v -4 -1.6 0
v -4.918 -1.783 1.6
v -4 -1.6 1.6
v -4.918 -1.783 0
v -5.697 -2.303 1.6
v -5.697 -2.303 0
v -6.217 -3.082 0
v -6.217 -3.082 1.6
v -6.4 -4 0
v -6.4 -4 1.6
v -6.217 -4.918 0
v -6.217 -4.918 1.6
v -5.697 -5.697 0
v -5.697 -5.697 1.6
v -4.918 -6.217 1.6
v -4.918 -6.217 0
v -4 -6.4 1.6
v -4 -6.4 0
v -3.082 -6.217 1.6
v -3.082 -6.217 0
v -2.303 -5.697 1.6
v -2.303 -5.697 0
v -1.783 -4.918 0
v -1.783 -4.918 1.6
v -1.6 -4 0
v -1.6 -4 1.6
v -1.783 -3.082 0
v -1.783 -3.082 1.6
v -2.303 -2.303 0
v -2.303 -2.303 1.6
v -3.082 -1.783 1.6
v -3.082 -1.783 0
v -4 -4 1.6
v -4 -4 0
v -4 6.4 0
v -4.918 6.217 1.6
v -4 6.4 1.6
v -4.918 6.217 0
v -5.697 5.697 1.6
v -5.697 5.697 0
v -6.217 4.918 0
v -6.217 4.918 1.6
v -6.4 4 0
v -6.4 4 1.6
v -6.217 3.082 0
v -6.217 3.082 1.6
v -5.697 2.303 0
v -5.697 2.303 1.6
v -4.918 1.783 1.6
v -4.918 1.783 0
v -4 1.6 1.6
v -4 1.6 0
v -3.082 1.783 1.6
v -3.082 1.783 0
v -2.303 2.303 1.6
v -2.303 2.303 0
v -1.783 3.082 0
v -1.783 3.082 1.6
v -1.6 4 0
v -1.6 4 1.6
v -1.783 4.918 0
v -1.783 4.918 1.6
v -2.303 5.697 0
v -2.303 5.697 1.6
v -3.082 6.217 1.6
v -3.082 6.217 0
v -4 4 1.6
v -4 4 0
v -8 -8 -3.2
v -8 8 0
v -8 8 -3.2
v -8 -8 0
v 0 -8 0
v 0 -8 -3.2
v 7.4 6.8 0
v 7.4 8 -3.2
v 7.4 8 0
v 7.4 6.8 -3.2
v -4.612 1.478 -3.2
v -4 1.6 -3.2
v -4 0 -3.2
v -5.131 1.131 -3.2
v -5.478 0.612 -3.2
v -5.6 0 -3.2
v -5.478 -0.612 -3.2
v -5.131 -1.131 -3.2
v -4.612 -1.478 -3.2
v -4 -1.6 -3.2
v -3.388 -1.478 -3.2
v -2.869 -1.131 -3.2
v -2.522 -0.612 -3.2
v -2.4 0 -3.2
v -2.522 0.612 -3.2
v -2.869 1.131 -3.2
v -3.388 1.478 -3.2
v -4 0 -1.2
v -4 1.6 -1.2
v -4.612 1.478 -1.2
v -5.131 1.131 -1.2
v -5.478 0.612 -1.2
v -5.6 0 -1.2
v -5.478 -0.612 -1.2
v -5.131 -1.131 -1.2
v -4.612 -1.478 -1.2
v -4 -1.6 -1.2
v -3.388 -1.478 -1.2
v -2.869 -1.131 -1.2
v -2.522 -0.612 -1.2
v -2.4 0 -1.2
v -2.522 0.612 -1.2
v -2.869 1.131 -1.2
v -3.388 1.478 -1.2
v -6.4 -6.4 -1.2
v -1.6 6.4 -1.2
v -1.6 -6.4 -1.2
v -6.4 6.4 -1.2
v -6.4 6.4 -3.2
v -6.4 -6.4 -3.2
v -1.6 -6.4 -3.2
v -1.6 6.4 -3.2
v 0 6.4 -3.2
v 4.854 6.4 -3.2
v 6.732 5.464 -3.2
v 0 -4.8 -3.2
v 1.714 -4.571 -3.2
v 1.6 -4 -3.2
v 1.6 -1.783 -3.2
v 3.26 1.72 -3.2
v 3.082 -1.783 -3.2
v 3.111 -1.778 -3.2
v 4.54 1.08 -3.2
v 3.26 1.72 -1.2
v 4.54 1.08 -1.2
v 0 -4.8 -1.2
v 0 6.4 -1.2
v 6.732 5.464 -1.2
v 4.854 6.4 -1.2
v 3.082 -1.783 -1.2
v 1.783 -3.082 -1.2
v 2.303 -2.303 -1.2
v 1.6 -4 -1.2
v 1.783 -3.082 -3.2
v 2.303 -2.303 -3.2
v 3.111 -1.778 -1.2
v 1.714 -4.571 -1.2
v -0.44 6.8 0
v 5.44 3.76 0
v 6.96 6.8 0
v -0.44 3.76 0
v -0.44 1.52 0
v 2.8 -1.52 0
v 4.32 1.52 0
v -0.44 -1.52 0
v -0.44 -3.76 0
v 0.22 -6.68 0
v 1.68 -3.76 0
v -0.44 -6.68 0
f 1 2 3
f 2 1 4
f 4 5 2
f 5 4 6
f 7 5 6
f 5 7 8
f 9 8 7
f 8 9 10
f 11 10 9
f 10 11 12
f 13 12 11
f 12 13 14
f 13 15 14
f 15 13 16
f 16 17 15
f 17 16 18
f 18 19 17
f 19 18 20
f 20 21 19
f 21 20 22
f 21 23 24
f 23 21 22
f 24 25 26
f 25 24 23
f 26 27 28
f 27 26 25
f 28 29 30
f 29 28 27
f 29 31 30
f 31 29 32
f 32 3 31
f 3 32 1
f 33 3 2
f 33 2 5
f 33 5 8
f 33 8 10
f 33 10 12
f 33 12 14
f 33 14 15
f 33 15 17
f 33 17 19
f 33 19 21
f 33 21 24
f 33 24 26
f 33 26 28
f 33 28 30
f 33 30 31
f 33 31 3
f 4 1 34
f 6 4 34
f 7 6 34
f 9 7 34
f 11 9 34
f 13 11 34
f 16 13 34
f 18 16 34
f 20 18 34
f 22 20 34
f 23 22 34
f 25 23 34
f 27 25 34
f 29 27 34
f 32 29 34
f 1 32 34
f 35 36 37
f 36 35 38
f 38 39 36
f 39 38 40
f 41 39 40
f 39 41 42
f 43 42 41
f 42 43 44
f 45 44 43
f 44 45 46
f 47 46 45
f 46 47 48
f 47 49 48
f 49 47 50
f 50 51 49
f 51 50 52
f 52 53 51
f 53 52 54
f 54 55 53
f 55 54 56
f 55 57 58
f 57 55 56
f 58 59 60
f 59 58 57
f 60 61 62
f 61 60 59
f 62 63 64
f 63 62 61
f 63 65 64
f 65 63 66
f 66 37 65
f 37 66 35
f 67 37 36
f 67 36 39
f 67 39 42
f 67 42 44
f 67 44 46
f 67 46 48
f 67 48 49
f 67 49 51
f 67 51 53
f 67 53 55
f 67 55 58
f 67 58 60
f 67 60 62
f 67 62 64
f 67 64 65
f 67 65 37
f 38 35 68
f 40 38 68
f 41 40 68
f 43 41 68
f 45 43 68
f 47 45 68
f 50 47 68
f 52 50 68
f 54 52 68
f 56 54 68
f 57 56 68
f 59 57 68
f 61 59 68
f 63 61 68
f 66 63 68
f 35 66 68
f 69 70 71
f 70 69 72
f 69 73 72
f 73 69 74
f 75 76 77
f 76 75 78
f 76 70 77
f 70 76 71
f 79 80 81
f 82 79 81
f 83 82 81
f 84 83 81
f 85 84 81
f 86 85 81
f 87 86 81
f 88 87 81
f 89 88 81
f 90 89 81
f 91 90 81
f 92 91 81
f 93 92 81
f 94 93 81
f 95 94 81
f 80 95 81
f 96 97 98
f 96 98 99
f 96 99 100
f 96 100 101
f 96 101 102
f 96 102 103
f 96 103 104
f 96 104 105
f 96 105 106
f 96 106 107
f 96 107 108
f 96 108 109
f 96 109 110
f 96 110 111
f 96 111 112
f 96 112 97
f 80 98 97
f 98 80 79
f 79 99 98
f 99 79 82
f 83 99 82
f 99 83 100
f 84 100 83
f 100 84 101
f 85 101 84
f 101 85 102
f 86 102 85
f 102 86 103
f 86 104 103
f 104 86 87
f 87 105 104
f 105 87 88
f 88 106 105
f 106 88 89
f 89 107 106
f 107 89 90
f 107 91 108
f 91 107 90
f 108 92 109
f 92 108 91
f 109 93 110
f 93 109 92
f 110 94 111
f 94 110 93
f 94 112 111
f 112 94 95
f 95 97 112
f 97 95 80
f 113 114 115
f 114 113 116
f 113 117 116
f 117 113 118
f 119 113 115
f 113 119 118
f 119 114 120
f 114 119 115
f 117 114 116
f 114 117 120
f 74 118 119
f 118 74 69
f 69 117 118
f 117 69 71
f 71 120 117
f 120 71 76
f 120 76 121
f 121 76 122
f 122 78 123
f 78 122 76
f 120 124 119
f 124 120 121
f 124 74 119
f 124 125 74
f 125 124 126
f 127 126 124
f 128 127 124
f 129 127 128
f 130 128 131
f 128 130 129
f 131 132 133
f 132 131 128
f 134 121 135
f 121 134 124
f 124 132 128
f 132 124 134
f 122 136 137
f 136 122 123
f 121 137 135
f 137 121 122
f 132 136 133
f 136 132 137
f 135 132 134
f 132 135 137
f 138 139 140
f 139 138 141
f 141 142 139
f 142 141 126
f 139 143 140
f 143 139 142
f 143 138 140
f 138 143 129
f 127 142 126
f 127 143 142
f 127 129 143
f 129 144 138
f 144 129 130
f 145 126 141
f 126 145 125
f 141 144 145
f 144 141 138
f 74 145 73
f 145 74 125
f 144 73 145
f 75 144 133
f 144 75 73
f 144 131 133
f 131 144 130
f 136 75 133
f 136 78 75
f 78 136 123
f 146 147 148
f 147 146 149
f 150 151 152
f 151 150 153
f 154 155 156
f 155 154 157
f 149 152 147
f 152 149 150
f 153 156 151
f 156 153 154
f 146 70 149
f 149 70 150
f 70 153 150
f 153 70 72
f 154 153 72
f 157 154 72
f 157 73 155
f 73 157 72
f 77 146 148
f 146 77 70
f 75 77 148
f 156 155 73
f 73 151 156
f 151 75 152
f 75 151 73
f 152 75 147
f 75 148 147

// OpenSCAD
// file: ../p/3-16edge.scad
use <../lib.scad>
function ldraw_lib__3_16edge() = [
// 0 Circle 0.1875
// 0 Name: 3-16edge.dat
// 0 Author: Donald Sutter [technog]
// 0 !LDRAW_ORG Primitive UPDATE 2017-01
// 0 !LICENSE Licensed under CC BY 4.0 : see CAreadme.txt
// 
// 0 BFC CERTIFY CCW
  [0,"BFC","CERTIFY"],
  [0,"BFC","CCW"],
// 
// 0 !HISTORY 2004-03-02 [PTadmin] Official Update 2004-01
// 0 !HISTORY 2007-06-24 [PTadmin] Header formatted for Contributor Agreement
// 0 !HISTORY 2008-07-01 [PTadmin] Official Update 2008-01
// 0 !HISTORY 2017-01-15 [Steffen] BFCed
// 0 !HISTORY 2017-12-30 [PTadmin] Official Update 2017-01
// 
// 
// 2 24 1 0 0 0.9239 0 0.3827
  [2,24,1,0,0,0.9239,0,0.3827],
// 2 24 0.9239 0 0.3827 0.7071 0 0.7071
  [2,24,0.9239,0,0.3827,0.7071,0,0.7071],
// 2 24 0.7071 0 0.7071 0.3827 0 0.9239
  [2,24,0.7071,0,0.7071,0.3827,0,0.9239],
];
module ldraw_lib__3_16edge(step=0, col=false, unit=2/5, alt=false, line=0.2, solid=!$preview)
    makepoly(ldraw_lib__3_16edge(), step=step, col=col, unit=unit, alt=alt, line=line, solid=solid);
ldraw_lib__3_16edge(line=0.2);
// file: ../p/3-16cyli.scad
use <../lib.scad>
$fa=1; $fs=0.2;
function ldraw_lib__3_16cyli(realsolid=false) = [
// 0 Cylinder 0.1875
// 0 Name: 3-16cyli.dat
// 0 Author: Mark Kennedy [mkennedy]
// 0 !LDRAW_ORG Primitive UPDATE 2005-01
// 0 !LICENSE Licensed under CC BY 2.0 and CC BY 4.0 : see CAreadme.txt
// 
// 0 BFC CERTIFY CCW
  [0,"BFC","CERTIFY"],
  [0,"BFC","CCW"],
// 
// 0 !HISTORY 2004-03-02 [PTadmin] Official Update 2004-01
// 0 !HISTORY 2004-12-11 [nielsk] Recreated using Primitive Generator, Edge lines fixed, BFC changed to CCW
// 0 !HISTORY 2005-12-28 [PTadmin] Official Update 2005-01
// 0 !HISTORY 2007-06-24 [PTadmin] Header formatted for Contributor Agreement
// 0 !HISTORY 2008-07-01 [PTadmin] Official Update 2008-01
// 
// 
// 4 16 .9239 1 .3827 .9239 0 .3827 1 0 0 1 1 0
  [4,16,.9239,1,.3827,.9239,0,.3827,1,0,0,1,1,0],
// 4 16 .7071 1 .7071 .7071 0 .7071 .9239 0 .3827 .9239 1 .3827
  [4,16,.7071,1,.7071,.7071,0,.7071,.9239,0,.3827,.9239,1,.3827],
// 4 16 .3827 1 .9239 .3827 0 .9239 .7071 0 .7071 .7071 1 .7071
  [4,16,.3827,1,.9239,.3827,0,.9239,.7071,0,.7071,.7071,1,.7071],
// 5 24 1 1 0 1 0 0 1 1 -.4142 .9239 1 .3827
  [5,24,1,1,0,1,0,0,1,1,-.4142,.9239,1,.3827],
// 5 24 .9239 1 .3827 .9239 0 .3827 1 1 0 .7071 1 .7071
  [5,24,.9239,1,.3827,.9239,0,.3827,1,1,0,.7071,1,.7071],
// 5 24 .7071 1 .7071 .7071 0 .7071 .9239 1 .3827 .3827 1 .9239
  [5,24,.7071,1,.7071,.7071,0,.7071,.9239,1,.3827,.3827,1,.9239],
// 5 24 .3827 1 .9239 .3827 0 .9239 .7071 1 .7071 0 1 1.0824
  [5,24,.3827,1,.9239,.3827,0,.9239,.7071,1,.7071,0,1,1.0824],
// 0
];
module ldraw_lib__3_16cyli(step=0, col=false, unit=2/5, alt=false, line=0.2, solid=!$preview)
    makepoly(ldraw_lib__3_16cyli(solid), step=step, col=col, unit=unit, alt=alt, line=line, solid=solid);
ldraw_lib__3_16cyli(line=0.2);
// file: ../p/4-4edge.scad
use <../lib.scad>
function ldraw_lib__4_4edge() = [
// 0 Circle 1.0
// 0 Name: 4-4edge.dat
// 0 Author: James Jessiman
// 0 !LDRAW_ORG Primitive UPDATE 2017-01
// 0 !LICENSE Licensed under CC BY 2.0 and CC BY 4.0 : see CAreadme.txt
// 
// 0 BFC CERTIFY CCW
  [0,"BFC","CERTIFY"],
  [0,"BFC","CCW"],
// 
// 0 !HISTORY 1998-12-15 [PTadmin] Official Update 1998-10
// 0 !HISTORY 2005-12-28 [PTadmin] Official Update 2005-01
// 0 !HISTORY 2007-06-24 [PTadmin] Header formatted for Contributor Agreement
// 0 !HISTORY 2008-07-01 [PTadmin] Official Update 2008-01
// 0 !HISTORY 2017-01-15 [Steffen] BFCed
// 0 !HISTORY 2017-12-30 [PTadmin] Official Update 2017-01
// 
// 
// 2 24 1 0 0 0.9239 0 0.3827
  [2,24,1,0,0,0.9239,0,0.3827],
// 2 24 0.9239 0 0.3827 0.7071 0 0.7071
  [2,24,0.9239,0,0.3827,0.7071,0,0.7071],
// 2 24 0.7071 0 0.7071 0.3827 0 0.9239
  [2,24,0.7071,0,0.7071,0.3827,0,0.9239],
// 2 24 0.3827 0 0.9239 0 0 1
  [2,24,0.3827,0,0.9239,0,0,1],
// 2 24 0 0 1 -0.3827 0 0.9239
  [2,24,0,0,1,-0.3827,0,0.9239],
// 2 24 -0.3827 0 0.9239 -0.7071 0 0.7071
  [2,24,-0.3827,0,0.9239,-0.7071,0,0.7071],
// 2 24 -0.7071 0 0.7071 -0.9239 0 0.3827
  [2,24,-0.7071,0,0.7071,-0.9239,0,0.3827],
// 2 24 -0.9239 0 0.3827 -1 0 -0
  [2,24,-0.9239,0,0.3827,-1,0,-0],
// 2 24 -1 0 -0 -0.9239 0 -0.3827
  [2,24,-1,0,-0,-0.9239,0,-0.3827],
// 2 24 -0.9239 0 -0.3827 -0.7071 0 -0.7071
  [2,24,-0.9239,0,-0.3827,-0.7071,0,-0.7071],
// 2 24 -0.7071 0 -0.7071 -0.3827 0 -0.9239
  [2,24,-0.7071,0,-0.7071,-0.3827,0,-0.9239],
// 2 24 -0.3827 0 -0.9239 0 0 -1
  [2,24,-0.3827,0,-0.9239,0,0,-1],
// 2 24 0 0 -1 0.3827 0 -0.9239
  [2,24,0,0,-1,0.3827,0,-0.9239],
// 2 24 0.3827 0 -0.9239 0.7071 0 -0.7071
  [2,24,0.3827,0,-0.9239,0.7071,0,-0.7071],
// 2 24 0.7071 0 -0.7071 0.9239 0 -0.3827
  [2,24,0.7071,0,-0.7071,0.9239,0,-0.3827],
// 2 24 0.9239 0 -0.3827 1 0 0
  [2,24,0.9239,0,-0.3827,1,0,0],
];
module ldraw_lib__4_4edge(step=0, col=false, unit=2/5, alt=false, line=0.2, solid=!$preview)
    makepoly(ldraw_lib__4_4edge(), step=step, col=col, unit=unit, alt=alt, line=line, solid=solid);
ldraw_lib__4_4edge(line=0.2);
// file: ../p/4-4disc.scad
use <../lib.scad>
function ldraw_lib__4_4disc() = [
// 0 Disc 1.0
// 0 Name: 4-4disc.dat
// 0 Author: James Jessiman
// 0 !LDRAW_ORG Primitive UPDATE 2002-02
// 0 !LICENSE Licensed under CC BY 2.0 and CC BY 4.0 : see CAreadme.txt
// 
// 0 BFC CERTIFY CCW
  [0,"BFC","CERTIFY"],
  [0,"BFC","CCW"],
// 
// 0 !HISTORY 1998-12-15 [PTadmin] Official Update 1998-10
// 0 !HISTORY 2002-03-23 [sbliss] Added BFC statement
// 0 !HISTORY 2002-04-25 [PTadmin] Official Update 2002-02
// 0 !HISTORY 2007-06-24 [PTadmin] Header formatted for Contributor Agreement
// 0 !HISTORY 2008-07-01 [PTadmin] Official Update 2008-01
// 
// 
// 3 16 0 0 0 1 0 0 0.9239 0 0.3827
  [3,16,0,0,0,1,0,0,0.9239,0,0.3827],
// 3 16 0 0 0 0.9239 0 0.3827 0.7071 0 0.7071
  [3,16,0,0,0,0.9239,0,0.3827,0.7071,0,0.7071],
// 3 16 0 0 0 0.7071 0 0.7071 0.3827 0 0.9239
  [3,16,0,0,0,0.7071,0,0.7071,0.3827,0,0.9239],
// 3 16 0 0 0 0.3827 0 0.9239 0 0 1
  [3,16,0,0,0,0.3827,0,0.9239,0,0,1],
// 3 16 0 0 0 0 0 1 -0.3827 0 0.9239
  [3,16,0,0,0,0,0,1,-0.3827,0,0.9239],
// 3 16 0 0 0 -0.3827 0 0.9239 -0.7071 0 0.7071
  [3,16,0,0,0,-0.3827,0,0.9239,-0.7071,0,0.7071],
// 3 16 0 0 0 -0.7071 0 0.7071 -0.9239 0 0.3827
  [3,16,0,0,0,-0.7071,0,0.7071,-0.9239,0,0.3827],
// 3 16 0 0 0 -0.9239 0 0.3827 -1 0 -0
  [3,16,0,0,0,-0.9239,0,0.3827,-1,0,-0],
// 3 16 0 0 0 -1 0 -0 -0.9239 0 -0.3827
  [3,16,0,0,0,-1,0,-0,-0.9239,0,-0.3827],
// 3 16 0 0 0 -0.9239 0 -0.3827 -0.7071 0 -0.7071
  [3,16,0,0,0,-0.9239,0,-0.3827,-0.7071,0,-0.7071],
// 3 16 0 0 0 -0.7071 0 -0.7071 -0.3827 0 -0.9239
  [3,16,0,0,0,-0.7071,0,-0.7071,-0.3827,0,-0.9239],
// 3 16 0 0 0 -0.3827 0 -0.9239 0 0 -1
  [3,16,0,0,0,-0.3827,0,-0.9239,0,0,-1],
// 3 16 0 0 0 0 0 -1 0.3827 0 -0.9239
  [3,16,0,0,0,0,0,-1,0.3827,0,-0.9239],
// 3 16 0 0 0 0.3827 0 -0.9239 0.7071 0 -0.7071
  [3,16,0,0,0,0.3827,0,-0.9239,0.7071,0,-0.7071],
// 3 16 0 0 0 0.7071 0 -0.7071 0.9239 0 -0.3827
  [3,16,0,0,0,0.7071,0,-0.7071,0.9239,0,-0.3827],
// 3 16 0 0 0 0.9239 0 -0.3827 1 0 0
  [3,16,0,0,0,0.9239,0,-0.3827,1,0,0],
// 0
];
module ldraw_lib__4_4disc(step=0, col=false, unit=2/5, alt=false, line=0.2, solid=!$preview)
    makepoly(ldraw_lib__4_4disc(), step=step, col=col, unit=unit, alt=alt, line=line, solid=solid);
ldraw_lib__4_4disc(line=0.2);
// file: ../p/4-4cyli.scad
use <../lib.scad>
$fa=1; $fs=0.2;
function ldraw_lib__4_4cyli(realsolid=false) = [
// 0 Cylinder 1.0
// 0 Name: 4-4cyli.dat
// 0 Author: James Jessiman
// 0 !LDRAW_ORG Primitive UPDATE 2005-01
// 0 !LICENSE Licensed under CC BY 2.0 and CC BY 4.0 : see CAreadme.txt
// 
// 0 BFC CERTIFY CCW
  [0,"BFC","CERTIFY"],
  [0,"BFC","CCW"],
// 
// 0 !HISTORY 1998-12-15 [PTadmin] Official Update 1998-10
// 0 !HISTORY 2002-03-23 [sbliss] Added BFC statement; merged headers from files in distributions LDraw 0.27 and Complete.
// 0 !HISTORY 2002-04-25 [PTadmin] Official Update 2002-02
// 0 !HISTORY 2004-12-14 [guyvivan] BFC CCW
// 0 !HISTORY 2005-12-28 [PTadmin] Official Update 2005-01
// 0 !HISTORY 2007-06-24 [PTadmin] Header formatted for Contributor Agreement
// 0 !HISTORY 2008-07-01 [PTadmin] Official Update 2008-01
// 
// 
// 4 16 1 1 0 0.9239 1 0.3827 0.9239 0 0.3827 1 0 0
  [4,16,1,1,0,0.9239,1,0.3827,0.9239,0,0.3827,1,0,0],
// 5 24 1 0 0 1 1 0 0.9239 0 0.3827 0.9239 0 -0.3827
  [5,24,1,0,0,1,1,0,0.9239,0,0.3827,0.9239,0,-0.3827],
// 4 16 0.9239 1 0.3827 0.7071 1 0.7071 0.7071 0 0.7071 0.9239 0 0.3827
  [4,16,0.9239,1,0.3827,0.7071,1,0.7071,0.7071,0,0.7071,0.9239,0,0.3827],
// 5 24 0.9239 0 0.3827 0.9239 1 0.3827 0.7071 0 0.7071 1 0 0
  [5,24,0.9239,0,0.3827,0.9239,1,0.3827,0.7071,0,0.7071,1,0,0],
// 4 16 0.7071 1 0.7071 0.3827 1 0.9239 0.3827 0 0.9239 0.7071 0 0.7071
  [4,16,0.7071,1,0.7071,0.3827,1,0.9239,0.3827,0,0.9239,0.7071,0,0.7071],
// 5 24 0.7071 0 0.7071 0.7071 1 0.7071 0.3827 0 0.9239 0.9239 0 0.3827
  [5,24,0.7071,0,0.7071,0.7071,1,0.7071,0.3827,0,0.9239,0.9239,0,0.3827],
// 4 16 0.3827 1 0.9239 0 1 1 0 0 1 0.3827 0 0.9239
  [4,16,0.3827,1,0.9239,0,1,1,0,0,1,0.3827,0,0.9239],
// 5 24 0.3827 0 0.9239 0.3827 1 0.9239 0 0 1 0.7071 0 0.7071
  [5,24,0.3827,0,0.9239,0.3827,1,0.9239,0,0,1,0.7071,0,0.7071],
// 4 16 0 1 1 -0.3827 1 0.9239 -0.3827 0 0.9239 0 0 1
  [4,16,0,1,1,-0.3827,1,0.9239,-0.3827,0,0.9239,0,0,1],
// 5 24 0 0 1 0 1 1 -0.3827 0 0.9239 0.3827 0 0.9239
  [5,24,0,0,1,0,1,1,-0.3827,0,0.9239,0.3827,0,0.9239],
// 4 16 -0.3827 1 0.9239 -0.7071 1 0.7071 -0.7071 0 0.7071 -0.3827 0 0.9239
  [4,16,-0.3827,1,0.9239,-0.7071,1,0.7071,-0.7071,0,0.7071,-0.3827,0,0.9239],
// 5 24 -0.3827 0 0.9239 -0.3827 1 0.9239 -0.7071 0 0.7071 0 0 1
  [5,24,-0.3827,0,0.9239,-0.3827,1,0.9239,-0.7071,0,0.7071,0,0,1],
// 4 16 -0.7071 1 0.7071 -0.9239 1 0.3827 -0.9239 0 0.3827 -0.7071 0 0.7071
  [4,16,-0.7071,1,0.7071,-0.9239,1,0.3827,-0.9239,0,0.3827,-0.7071,0,0.7071],
// 5 24 -0.7071 0 0.7071 -0.7071 1 0.7071 -0.9239 0 0.3827 -0.3827 0 0.9239
  [5,24,-0.7071,0,0.7071,-0.7071,1,0.7071,-0.9239,0,0.3827,-0.3827,0,0.9239],
// 4 16 -0.9239 1 0.3827 -1 1 0 -1 0 0 -0.9239 0 0.3827
  [4,16,-0.9239,1,0.3827,-1,1,0,-1,0,0,-0.9239,0,0.3827],
// 5 24 -0.9239 0 0.3827 -0.9239 1 0.3827 -1 0 0 -0.7071 0 0.7071
  [5,24,-0.9239,0,0.3827,-0.9239,1,0.3827,-1,0,0,-0.7071,0,0.7071],
// 4 16 -1 1 0 -0.9239 1 -0.3827 -0.9239 0 -0.3827 -1 0 0
  [4,16,-1,1,0,-0.9239,1,-0.3827,-0.9239,0,-0.3827,-1,0,0],
// 5 24 -1 0 0 -1 1 0 -0.9239 0 -0.3827 -0.9239 0 0.3827
  [5,24,-1,0,0,-1,1,0,-0.9239,0,-0.3827,-0.9239,0,0.3827],
// 4 16 -0.9239 1 -0.3827 -0.7071 1 -0.7071 -0.7071 0 -0.7071 -0.9239 0 -0.3827
  [4,16,-0.9239,1,-0.3827,-0.7071,1,-0.7071,-0.7071,0,-0.7071,-0.9239,0,-0.3827],
// 5 24 -0.9239 0 -0.3827 -0.9239 1 -0.3827 -0.7071 0 -0.7071 -1 0 0
  [5,24,-0.9239,0,-0.3827,-0.9239,1,-0.3827,-0.7071,0,-0.7071,-1,0,0],
// 4 16 -0.7071 1 -0.7071 -0.3827 1 -0.9239 -0.3827 0 -0.9239 -0.7071 0 -0.7071
  [4,16,-0.7071,1,-0.7071,-0.3827,1,-0.9239,-0.3827,0,-0.9239,-0.7071,0,-0.7071],
// 5 24 -0.7071 0 -0.7071 -0.7071 1 -0.7071 -0.3827 0 -0.9239 -0.9239 0 -0.3827
  [5,24,-0.7071,0,-0.7071,-0.7071,1,-0.7071,-0.3827,0,-0.9239,-0.9239,0,-0.3827],
// 4 16 -0.3827 1 -0.9239 0 1 -1 0 0 -1 -0.3827 0 -0.9239
  [4,16,-0.3827,1,-0.9239,0,1,-1,0,0,-1,-0.3827,0,-0.9239],
// 5 24 -0.3827 0 -0.9239 -0.3827 1 -0.9239 0 0 -1 -0.7071 0 -0.7071
  [5,24,-0.3827,0,-0.9239,-0.3827,1,-0.9239,0,0,-1,-0.7071,0,-0.7071],
// 4 16 0 1 -1 0.3827 1 -0.9239 0.3827 0 -0.9239 0 0 -1
  [4,16,0,1,-1,0.3827,1,-0.9239,0.3827,0,-0.9239,0,0,-1],
// 5 24 0 0 -1 0 1 -1 0.3827 0 -0.9239 -0.3827 0 -0.9239
  [5,24,0,0,-1,0,1,-1,0.3827,0,-0.9239,-0.3827,0,-0.9239],
// 4 16 0.3827 1 -0.9239 0.7071 1 -0.7071 0.7071 0 -0.7071 0.3827 0 -0.9239
  [4,16,0.3827,1,-0.9239,0.7071,1,-0.7071,0.7071,0,-0.7071,0.3827,0,-0.9239],
// 5 24 0.3827 0 -0.9239 0.3827 1 -0.9239 0.7071 0 -0.7071 0 0 -1
  [5,24,0.3827,0,-0.9239,0.3827,1,-0.9239,0.7071,0,-0.7071,0,0,-1],
// 4 16 0.7071 1 -0.7071 0.9239 1 -0.3827 0.9239 0 -0.3827 0.7071 0 -0.7071
  [4,16,0.7071,1,-0.7071,0.9239,1,-0.3827,0.9239,0,-0.3827,0.7071,0,-0.7071],
// 5 24 0.7071 0 -0.7071 0.7071 1 -0.7071 0.9239 0 -0.3827 0.3827 0 -0.9239
  [5,24,0.7071,0,-0.7071,0.7071,1,-0.7071,0.9239,0,-0.3827,0.3827,0,-0.9239],
// 4 16 0.9239 1 -0.3827 1 1 0 1 0 0 0.9239 0 -0.3827
  [4,16,0.9239,1,-0.3827,1,1,0,1,0,0,0.9239,0,-0.3827],
// 5 24 0.9239 0 -0.3827 0.9239 1 -0.3827 1 0 0 0.7071 0 -0.7071
  [5,24,0.9239,0,-0.3827,0.9239,1,-0.3827,1,0,0,0.7071,0,-0.7071],
// 0
];
module ldraw_lib__4_4cyli(step=0, col=false, unit=2/5, alt=false, line=0.2, solid=!$preview)
    makepoly(ldraw_lib__4_4cyli(solid), step=step, col=col, unit=unit, alt=alt, line=line, solid=solid);
ldraw_lib__4_4cyli(line=0.2);
// file: ../p/rect3.scad
use <../lib.scad>
function ldraw_lib__rect3() = [
// 0 Rectangle with 3 Edges
// 0 Name: rect3.dat
// 0 Author: Mark Kennedy [mkennedy]
// 0 !LDRAW_ORG Primitive UPDATE 2010-01
// 0 !LICENSE Licensed under CC BY 4.0 : see CAreadme.txt
// 
// 0 BFC CERTIFY CCW
  [0,"BFC","CERTIFY"],
  [0,"BFC","CCW"],
// 
// 0 !HISTORY 2003-08-01 [PTadmin] Official Update 2003-02
// 0 !HISTORY 2007-06-24 [PTadmin] Header formatted for Contributor Agreement
// 0 !HISTORY 2008-07-01 [PTadmin] Official Update 2008-01
// 0 !HISTORY 2010-01-17 [mikeheide] Change winding to CCW
// 0 !HISTORY 2010-04-05 [PTadmin] Official Update 2010-01
// 
// 
// 2 24 1 0 1 -1 0 1
  [2,24,1,0,1,-1,0,1],
// 2 24 1 0 1 1 0 -1
  [2,24,1,0,1,1,0,-1],
// 2 24 -1 0 1 -1 0 -1
  [2,24,-1,0,1,-1,0,-1],
// 4 16 -1 0 1 -1 0 -1 1 0 -1 1 0 1
  [4,16,-1,0,1,-1,0,-1,1,0,-1,1,0,1],
// 0 //
];
module ldraw_lib__rect3(step=0, col=false, unit=2/5, alt=false, line=0.2, solid=!$preview)
    makepoly(ldraw_lib__rect3(), step=step, col=col, unit=unit, alt=alt, line=line, solid=solid);
ldraw_lib__rect3(line=0.2);
// file: ../p/rect.scad
use <../lib.scad>
function ldraw_lib__rect() = [
// 0 Rectangle
// 0 Name: rect.dat
// 0 Author: James Jessiman
// 0 !LDRAW_ORG Primitive UPDATE 2010-01
// 0 !LICENSE Licensed under CC BY 2.0 and CC BY 4.0 : see CAreadme.txt
// 
// 0 BFC CERTIFY CCW
  [0,"BFC","CERTIFY"],
  [0,"BFC","CCW"],
// 
// 0 !HISTORY 2002-04-05 [hafhead] Added BFC statement
// 0 !HISTORY 2002-04-25 [PTadmin] Official Update 2002-02
// 0 !HISTORY 2007-06-24 [PTadmin] Header formatted for Contributor Agreement
// 0 !HISTORY 2008-07-01 [PTadmin] Official Update 2008-01
// 0 !HISTORY 2010-01-17 [mikeheide] changed winding to CCW
// 0 !HISTORY 2010-04-05 [PTadmin] Official Update 2010-01
// 
// 
// 2 24 1 0 1 -1 0 1
  [2,24,1,0,1,-1,0,1],
// 2 24 -1 0 1 -1 0 -1
  [2,24,-1,0,1,-1,0,-1],
// 2 24 -1 0 -1 1 0 -1
  [2,24,-1,0,-1,1,0,-1],
// 2 24 1 0 -1 1 0 1
  [2,24,1,0,-1,1,0,1],
// 4 16 -1 0 1 -1 0 -1 1 0 -1 1 0 1
  [4,16,-1,0,1,-1,0,-1,1,0,-1,1,0,1],
// 0
];
makepoly(ldraw_lib__rect(), line=0.2);
// file: ../p/3-16tndis.scad
use <../lib.scad>
function ldraw_lib__3_16tndis() = [
// 0 Disc Negative Truncated 0.1875
// 0 Name: 3-16tndis.dat
// 0 Author: Massimo Maso [Sirio]
// 0 !LDRAW_ORG Primitive UPDATE 2022-02
// 0 !LICENSE Licensed under CC BY 4.0 : see CAreadme.txt
// 
// 0 BFC CERTIFY CCW
  [0,"BFC","CERTIFY"],
  [0,"BFC","CCW"],
// 
// 0 !HISTORY 2022-03-06 [PTadmin] Official Update 2022-02
// 
// 
// 3 16 1 0 .9239 .9239 0 .3827 1 0 0
  [3,16,1,0,.9239,.9239,0,.3827,1,0,0],
// 3 16 1 0 .9239 .7071 0 .7071 .9239 0 .3827
  [3,16,1,0,.9239,.7071,0,.7071,.9239,0,.3827],
// 3 16 1 0 .9239 .3827 0 .9239 .7071 0 .7071
  [3,16,1,0,.9239,.3827,0,.9239,.7071,0,.7071],
];
module ldraw_lib__3_16tndis(step=0, col=false, unit=2/5, alt=false, line=0.2, solid=!$preview)
    makepoly(ldraw_lib__3_16tndis(), step=step, col=col, unit=unit, alt=alt, line=line, solid=solid);
ldraw_lib__3_16tndis(line=0.2);
// file: ../p/3-16cylo.scad
use <../lib.scad>
use <3-16cyli.scad>
use <3-16edge.scad>
$fa=1; $fs=0.2;
function ldraw_lib__3_16cylo(realsolid=false) = [
// 0 Cylinder Open 0.1875
// 0 Name: 3-16cylo.dat
// 0 Author: J.C. Tchang [tchang]
// 0 !LDRAW_ORG Primitive UPDATE 2013-01
// 0 !LICENSE Licensed under CC BY 2.0 and CC BY 4.0 : see CAreadme.txt
// 
// 0 BFC CERTIFY CCW
  [0,"BFC","CERTIFY"],
  [0,"BFC","CCW"],
// 
// 0 !HISTORY 2013-07-21 [PTadmin] Official Update 2013-01
// 
// 
// 1 16 0 0 0 1 0 0 0 1 0 0 0 1 3-16edge.dat
  [1,16,0,0,0,1,0,0,0,1,0,0,0,1, ldraw_lib__3_16edge(realsolid)],
// 1 16 0 1 0 1 0 0 0 1 0 0 0 1 3-16edge.dat
  [1,16,0,1,0,1,0,0,0,1,0,0,0,1, ldraw_lib__3_16edge(realsolid)],
// 1 16 0 0 0 1 0 0 0 1 0 0 0 1 3-16cyli.dat
  [1,16,0,0,0,1,0,0,0,1,0,0,0,1, ldraw_lib__3_16cyli(realsolid)],
];
module ldraw_lib__3_16cylo(step=0, col=false, unit=2/5, alt=false, line=0.2, solid=!$preview)
    makepoly(ldraw_lib__3_16cylo(solid), step=step, col=col, unit=unit, alt=alt, line=line, solid=solid);
ldraw_lib__3_16cylo(line=0.2);
// file: ../p/3-16chrd.scad
use <../lib.scad>
$fa=1; $fs=0.2;
function ldraw_lib__3_16chrd(realsolid=false) = [
// 0 Chord 0.1875
// 0 Name: 3-16chrd.dat
// 0 Author: Niels Karsdorp [nielsk]
// 0 !LDRAW_ORG Primitive UPDATE 2009-01
// 0 !LICENSE Licensed under CC BY 2.0 and CC BY 4.0 : see CAreadme.txt
// 
// 0 BFC CERTIFY CCW
  [0,"BFC","CERTIFY"],
  [0,"BFC","CCW"],
// 
// 0 !HISTORY 2009-05-02 [PTadmin] Official Update 2009-01
// 
// 
// 4 16 1 0 0 0.9239 0 0.3827 0.7071 0 0.7071 0.3827 0 0.9239
  [4,16,1,0,0,0.9239,0,0.3827,0.7071,0,0.7071,0.3827,0,0.9239],
// 0
// 
];
module ldraw_lib__3_16chrd(step=0, col=false, unit=2/5, alt=false, line=0.2, solid=!$preview)
    makepoly(ldraw_lib__3_16chrd(solid), step=step, col=col, unit=unit, alt=alt, line=line, solid=solid);
ldraw_lib__3_16chrd(line=0.2);
// file: ../p/stud.scad
use <../lib.scad>
use <4-4cyli.scad>
use <4-4disc.scad>
use <4-4edge.scad>
function ldraw_lib__stud() = [
// 0 Stud
// 0 Name: stud.dat
// 0 Author: James Jessiman
// 0 !LDRAW_ORG Primitive UPDATE 2012-01
// 0 !LICENSE Licensed under CC BY 4.0 : see CAreadme.txt
// 
// 0 BFC CERTIFY CCW
  [0,"BFC","CERTIFY"],
  [0,"BFC","CCW"],
// 
// 0 !HISTORY 2002-04-04 [sbliss] Modified for BFC compliance
// 0 !HISTORY 2002-04-25 [PTadmin] Official Update 2002-02
// 0 !HISTORY 2007-06-24 [PTadmin] Header formatted for Contributor Agreement
// 0 !HISTORY 2008-07-01 [PTadmin] Official Update 2008-01
// 0 !HISTORY 2012-02-16 [Philo] Changed to CCW
// 0 !HISTORY 2012-03-30 [PTadmin] Official Update 2012-01
// 
// 
// 1 16 0 0 0 6 0 0 0 1 0 0 0 6 4-4edge.dat
  [1,16,0,0,0,6,0,0,0,1,0,0,0,6, ldraw_lib__4_4edge()],
// 1 16 0 -4 0 6 0 0 0 1 0 0 0 6 4-4edge.dat
  [1,16,0,-4,0,6,0,0,0,1,0,0,0,6, ldraw_lib__4_4edge()],
// 1 16 0 0 0 6 0 0 0 -4 0 0 0 6 4-4cyli.dat
  [1,16,0,0,0,6,0,0,0,-4,0,0,0,6, ldraw_lib__4_4cyli()],
// 1 16 0 -4 0 6 0 0 0 1 0 0 0 6 4-4disc.dat
  [1,16,0,-4,0,6,0,0,0,1,0,0,0,6, ldraw_lib__4_4disc()],
  [-1,16,0,0,0,6,0,0,0,-1,0,0,0,6, ldraw_lib__4_4disc()],
];
module ldraw_lib__stud(step=0, col=false, unit=2/5, alt=false, line=0.2, solid=!$preview)
    makepoly(ldraw_lib__stud(), step=step, col=col, unit=unit, alt=alt, line=line, solid=solid);
ldraw_lib__stud(line=0.2);
// file: ../p/stud3.scad
use <../lib.scad>
use <4-4cyli.scad>
use <4-4disc.scad>
use <4-4edge.scad>
function ldraw_lib__stud3() = [
// 0 Stud Tube Solid
// 0 Name: stud3.dat
// 0 Author: James Jessiman
// 0 !LDRAW_ORG Primitive UPDATE 2012-01
// 0 !LICENSE Licensed under CC BY 4.0 : see CAreadme.txt
// 
// 0 BFC CERTIFY CCW
  [0,"BFC","CERTIFY"],
  [0,"BFC","CCW"],
// 
// 0 !HISTORY 2002-04-04 [sbliss] Modified for BFC compliance
// 0 !HISTORY 2002-04-25 [PTadmin] Official Update 2002-02
// 0 !HISTORY 2007-06-24 [PTadmin] Header formatted for Contributor Agreement
// 0 !HISTORY 2008-07-01 [PTadmin] Official Update 2008-01
// 0 !HISTORY 2012-02-16 [Philo] Changed to CCW
// 0 !HISTORY 2012-03-30 [PTadmin] Official Update 2012-01
// 
// 
// 1 16 0 -4 0 4 0 0 0 1 0 0 0 4 4-4edge.dat
  [1,16,0,-4,0,4,0,0,0,1,0,0,0,4, ldraw_lib__4_4edge()],
// 1 16 0 0 0 4 0 0 0 1 0 0 0 4 4-4edge.dat
  [1,16,0,0,0,4,0,0,0,1,0,0,0,4, ldraw_lib__4_4edge()],
// 1 16 0 -4 0 4 0 0 0 1 0 0 0 4 4-4disc.dat
  [1,16,0,-4,0,4,0,0,0,1,0,0,0,4, ldraw_lib__4_4disc()],
  [-1,16,0,0,0,4,0,0,0,-1,0,0,0,4, ldraw_lib__4_4disc()],
// 1 16 0 -4 0 4 0 0 0 4 0 0 0 4 4-4cyli.dat
  [1,16,0,-4,0,4,0,0,0,4,0,0,0,4, ldraw_lib__4_4cyli()],
];
module ldraw_lib__stud3(step=0, col=false, unit=2/5, alt=false, line=0.2, solid=!$preview)
    makepoly(ldraw_lib__stud3(), step=step, col=col, unit=unit, alt=alt, line=line, solid=solid);
ldraw_lib__stud3(line=0.2);
// file: s/51739s01.scad
use <../../lib.scad>
use <../../p/3-16chrd.scad>
use <../../p/3-16cylo.scad>
use <../../p/3-16tndis.scad>
use <../../p/box2-5.scad>
use <../../p/box2-7.scad>
use <../../p/rect.scad>
use <../../p/rect3.scad>
function ldraw_lib__s__51739s01() = [
// 0 ~Wing  2 x  4 - Half Bottom Section
// 0 Name: s\51739s01.dat
// 0 Author: Magnus Forsberg [MagFors]
// 0 !LDRAW_ORG Subpart UPDATE 2025-07
// 0 !LICENSE Licensed under CC BY 4.0 : see CAreadme.txt
// 
// 0 BFC CERTIFY CCW
  [0,"BFC","CERTIFY"],
  [0,"BFC","CCW"],
// 
// 0 !HISTORY 2017-12-30 [PTadmin] Official Update 2017-01
// 0 !HISTORY 2025-04-19 [Blechtaler] used cylo prim for the stud dent
// 0 !HISTORY 2025-07-12 [MagFors] Removed top surface for prints
// 0 !HISTORY 2025-07-27 [OrionP] Official Update 2025-07
// 
// 3 16 16 8 16 38.5 8 20 20 8 16
  [3,16,16,8,16,38.5,8,20,20,8,16],
// 3 16 20 8 16 38.5 8 20 32.136 8 16
  [3,16,20,8,16,38.5,8,20,32.136,8,16],
// 2 24 38.5 0 17 20 0 -20
  [2,24,38.5,0,17,20,0,-20],
// 2 24 38.5 8 17 38.5 0 17
  [2,24,38.5,8,17,38.5,0,17],
// 
// 4 16 32.136 8 16 38.5 8 20 38.5 8 17 36.83 8 13.66
  [4,16,32.136,8,16,38.5,8,20,38.5,8,17,36.83,8,13.66],
// 4 16 16 8 16 20 8 16 20 8 -12 16 8 -16
  [4,16,16,8,16,20,8,16,20,8,-12,16,8,-16],
// 3 16 20 8 -12 20 8 -20 16 8 -16
  [3,16,20,8,-12,20,8,-20,16,8,-16],
// 4 16 20 8 -12 24 8 -10 24.2857 8 -11.4286 20 8 -20
  [4,16,20,8,-12,24,8,-10,24.2857,8,-11.4286,20,8,-20],
// 3 16 24 8 -4.4566 24 8 -10 20 8 -12
  [3,16,24,8,-4.4566,24,8,-10,20,8,-12],
// 3 16 28.15 8 4.3 24 8 -4.4566 20 8 -12
  [3,16,28.15,8,4.3,24,8,-4.4566,20,8,-12],
// 3 16 27.7038 8 -4.4566 24 8 -4.4566 28.15 8 4.3
  [3,16,27.7038,8,-4.4566,24,8,-4.4566,28.15,8,4.3],
// 4 16 31.35 8 2.7 27.7778 8 -4.4444 27.7038 8 -4.4566 28.15 8 4.3
  [4,16,31.35,8,2.7,27.7778,8,-4.4444,27.7038,8,-4.4566,28.15,8,4.3],
// 2 24 24.2857 8 -11.4286 20 8 -20
  [2,24,24.2857,8,-11.4286,20,8,-20],
// 2 24 31.35 8 2.7 27.7778 8 -4.4444
  [2,24,31.35,8,2.7,27.7778,8,-4.4444],
// 2 24 36.83 8 13.66 38.5 8 17
  [2,24,36.83,8,13.66,38.5,8,17],
// 2 24 31.35 3 2.7 36.83 3 13.66
  [2,24,31.35,3,2.7,36.83,3,13.66],
// 1 16 29.75 5.5 3.5 0 0 -1.6 2.5 0 0 0 -1 0.8 rect.dat
  [1,16,29.75,5.5,3.5,0,0,-1.6,2.5,0,0,0,-1,0.8, ldraw_lib__rect()],
// 0 BFC INVERTNEXT
  [0,"BFC","INVERTNEXT"],
// 1 16 24.075 5.5 10.15 0 -4.075 0 -2.5 0 0 0 -8.15 -14 box2-7.dat
  [1,16,24.075,5.5,10.15,0,-4.075,0,-2.5,0,0,0,-8.15,-14, ldraw_lib__box2_7()],
// 0 BFC INVERTNEXT
  [0,"BFC","INVERTNEXT"],
// 1 16 28.415 5.5 14.83 0 6.068 -2.347 -2.5 0 0 0 0 1.17 box2-5.dat
  [1,16,28.415,5.5,14.83,0,6.068,-2.347,-2.5,0,0,0,0,1.17, ldraw_lib__box2_5()],
// 4 16 36.83 3 13.66 31.35 3 2.7 28.15 3 4.3 32.136 3 16
  [4,16,36.83,3,13.66,31.35,3,2.7,28.15,3,4.3,32.136,3,16],
// 4 16 32.136 3 16 28.15 3 4.3 20 3 -12 20 3 16
  [4,16,32.136,3,16,28.15,3,4.3,20,3,-12,20,3,16],
// 
// 1 16 30 3 -10 -6 0 0 0 -1 0 0 0 6 3-16chrd.dat
  [1,16,30,3,-10,-6,0,0,0,-1,0,0,0,6, ldraw_lib__3_16chrd()],
// 0 BFC INVERTNEXT
  [0,"BFC","INVERTNEXT"],
// 1 16 30 3 -10 -6 0 0 0 5 0 0 0 6 3-16cylo.dat
  [1,16,30,3,-10,-6,0,0,0,5,0,0,0,6, ldraw_lib__3_16cylo()],
// 1 16 30 8 -10 -6 0 0 0 -1 0 0 0 6 3-16tndis.dat
  [1,16,30,8,-10,-6,0,0,0,-1,0,0,0,6, ldraw_lib__3_16tndis()],
// 
// 1 16 27.7408 5.5 -4.4505 0 0 0.037 2.5 0 0 0 1 0.0061 rect3.dat
  [1,16,27.7408,5.5,-4.4505,0,0,0.037,2.5,0,0,0,1,0.0061, ldraw_lib__rect3()],
// 1 16 24.14285 5.5 -10.7143 0 -1 0.14285 -2.5 0 0 0 0 -0.7143 rect3.dat
  [1,16,24.14285,5.5,-10.7143,0,-1,0.14285,-2.5,0,0,0,0,-0.7143, ldraw_lib__rect3()],
// 5 24 27.7038 3 -4.4566 27.7038 8 -4.4566 28.486 3 -4.301 25.7574 3 -5.7574
  [5,24,27.7038,3,-4.4566,27.7038,8,-4.4566,28.486,3,-4.301,25.7574,3,-5.7574],
// 5 24 24 3 -10 24 8 -10 24.4566 3 -7.7038 24.378 3 -11.9
  [5,24,24,3,-10,24,8,-10,24.4566,3,-7.7038,24.378,3,-11.9],
// 2 24 27.7778 3 -4.4444 24.2857 3 -11.4286
  [2,24,27.7778,3,-4.4444,24.2857,3,-11.4286],
// 4 16 27.7038 3 -4.4566 27.7778 3 -4.4444 24.2857 3 -11.4286 24 3 -10
  [4,16,27.7038,3,-4.4566,27.7778,3,-4.4444,24.2857,3,-11.4286,24,3,-10],
// 
// 4 16 24.2857 8 -11.4286 24.2857 3 -11.4286 20 0 -20 20 8 -20
  [4,16,24.2857,8,-11.4286,24.2857,3,-11.4286,20,0,-20,20,8,-20],
// 3 16 27.7778 3 -4.4444 20 0 -20 24.2857 3 -11.4286
  [3,16,27.7778,3,-4.4444,20,0,-20,24.2857,3,-11.4286],
// 4 16 31.35 3 2.7 38.5 0 17 20 0 -20 27.7778 3 -4.4444
  [4,16,31.35,3,2.7,38.5,0,17,20,0,-20,27.7778,3,-4.4444],
// 4 16 31.35 3 2.7 27.7778 3 -4.4444 27.7778 8 -4.4444 31.35 8 2.7
  [4,16,31.35,3,2.7,27.7778,3,-4.4444,27.7778,8,-4.4444,31.35,8,2.7],
// 3 16 36.83 3 13.66 38.5 0 17 31.35 3 2.7
  [3,16,36.83,3,13.66,38.5,0,17,31.35,3,2.7],
// 4 16 36.83 8 13.66 38.5 8 17 38.5 0 17 36.83 3 13.66
  [4,16,36.83,8,13.66,38.5,8,17,38.5,0,17,36.83,3,13.66],
];
module ldraw_lib__s__51739s01(step=0, col=false, unit=2/5, alt=false, line=0.2, solid=!$preview)
    makepoly(ldraw_lib__s__51739s01(), step=step, col=col, unit=unit, alt=alt, line=line, solid=solid);
ldraw_lib__s__51739s01(line=0.2);
// file: ../p/box5.scad
use <../lib.scad>
function ldraw_lib__box5() = [
// 0 Box with 5 Faces and All Edges
// 0 Name: box5.dat
// 0 Author: James Jessiman
// 0 !LDRAW_ORG Primitive UPDATE 2012-01
// 0 !LICENSE Licensed under CC BY 2.0 and CC BY 4.0 : see CAreadme.txt
// 
// 0 BFC CERTIFY CCW
  [0,"BFC","CERTIFY"],
  [0,"BFC","CCW"],
// 
// 0 !HISTORY 2002-04-03 [sbliss] Modified for BFC compliance
// 0 !HISTORY 2002-04-25 [PTadmin] Official Update 2002-02
// 0 !HISTORY 2007-06-24 [PTadmin] Header formatted for Contributor Agreement
// 0 !HISTORY 2008-07-01 [PTadmin] Official Update 2008-01
// 0 !HISTORY 2012-02-16 [Philo] Changed to CCW
// 0 !HISTORY 2012-03-30 [PTadmin] Official Update 2012-01
// 
// 
// 2 24 1 1 1 -1 1 1
  [2,24,1,1,1,-1,1,1],
// 2 24 -1 1 1 -1 1 -1
  [2,24,-1,1,1,-1,1,-1],
// 2 24 -1 1 -1 1 1 -1
  [2,24,-1,1,-1,1,1,-1],
// 2 24 1 1 -1 1 1 1
  [2,24,1,1,-1,1,1,1],
// 2 24 1 0 1 -1 0 1
  [2,24,1,0,1,-1,0,1],
// 2 24 -1 0 1 -1 0 -1
  [2,24,-1,0,1,-1,0,-1],
// 2 24 -1 0 -1 1 0 -1
  [2,24,-1,0,-1,1,0,-1],
// 2 24 1 0 -1 1 0 1
  [2,24,1,0,-1,1,0,1],
// 2 24 1 0 1 1 1 1
  [2,24,1,0,1,1,1,1],
// 2 24 -1 0 1 -1 1 1
  [2,24,-1,0,1,-1,1,1],
// 2 24 1 0 -1 1 1 -1
  [2,24,1,0,-1,1,1,-1],
// 2 24 -1 0 -1 -1 1 -1
  [2,24,-1,0,-1,-1,1,-1],
// 4 16 -1 1 1 1 1 1 1 1 -1 -1 1 -1
  [4,16,-1,1,1,1,1,1,1,1,-1,-1,1,-1],
// 4 16 -1 1 1 -1 0 1 1 0 1 1 1 1
  [4,16,-1,1,1,-1,0,1,1,0,1,1,1,1],
// 4 16 -1 1 -1 -1 0 -1 -1 0 1 -1 1 1
  [4,16,-1,1,-1,-1,0,-1,-1,0,1,-1,1,1],
// 4 16 1 1 -1 1 0 -1 -1 0 -1 -1 1 -1
  [4,16,1,1,-1,1,0,-1,-1,0,-1,-1,1,-1],
// 4 16 1 1 1 1 0 1 1 0 -1 1 1 -1
  [4,16,1,1,1,1,0,1,1,0,-1,1,1,-1],
];
makepoly(ldraw_lib__box5(), line=0.2);
// file: ../p/box2-7.scad
use <../lib.scad>
function ldraw_lib__box2_7() = [
// 0 Box with  2 Faces without  7 Edges
// 0 Name: box2-7.dat
// 0 Author: Willy Tschager [Holly-Wood]
// 0 !LDRAW_ORG Primitive UPDATE 2024-01
// 0 !LICENSE Licensed under CC BY 4.0 : see CAreadme.txt
// 
// 0 BFC CERTIFY CCW
  [0,"BFC","CERTIFY"],
  [0,"BFC","CCW"],
// 
// 0 !HISTORY 2009-05-02 [PTadmin] Official Update 2009-01
// 0 !HISTORY 2024-01-02 [Holly-Wood] Complete re-write, original by guyvivan
// 0 !HISTORY 2024-01-29 [OrionP] Official Update 2024-01
// 
// 2 24 -1 1 -1 -1 1 1
  [2,24,-1,1,-1,-1,1,1],
// 2 24 1 1 1 1 1 -1
  [2,24,1,1,1,1,1,-1],
// 4 16 -1 1 1 1 1 1 1 1 -1 -1 1 -1
  [4,16,-1,1,1,1,1,1,1,1,-1,-1,1,-1],
// 
// 2 24 -1 1 1 -1 -1 1
  [2,24,-1,1,1,-1,-1,1],
// 2 24 1 1 1 1 -1 1
  [2,24,1,1,1,1,-1,1],
// 4 16 1 -1 1 1 1 1 -1 1 1 -1 -1 1
  [4,16,1,-1,1,1,1,1,-1,1,1,-1,-1,1],
// 
// 2 24 -1 1 1 1 1 1
  [2,24,-1,1,1,1,1,1],
];
module ldraw_lib__box2_7(step=0, col=false, unit=2/5, alt=false, line=0.2, solid=!$preview)
    makepoly(ldraw_lib__box2_7(), step=step, col=col, unit=unit, alt=alt, line=line, solid=solid);
ldraw_lib__box2_7(line=0.2);
// file: ../p/box2-5.scad
use <../lib.scad>
$fa=1; $fs=0.2;
function ldraw_lib__box2_5(realsolid=false) = [
// 0 Box with 2 Faces without 5 Edges
// 0 Name: box2-5.dat
// 0 Author: Steffen [Steffen]
// 0 !LDRAW_ORG Primitive UPDATE 2003-03
// 0 !LICENSE Licensed under CC BY 2.0 and CC BY 4.0 : see CAreadme.txt
// 
// 0 BFC CERTIFY CCW
  [0,"BFC","CERTIFY"],
  [0,"BFC","CCW"],
// 
// 0 !HISTORY 2003-12-19 [PTadmin] Official Update 2003-03
// 0 !HISTORY 2007-06-24 [PTadmin] Header formatted for Contributor Agreement
// 0 !HISTORY 2008-07-01 [PTadmin] Official Update 2008-01
// 
// 
// 2 24 1 1 1 -1 1 1
  [2,24,1,1,1,-1,1,1],
// 2 24 1 1 -1 -1 1 -1
  [2,24,1,1,-1,-1,1,-1],
// 2 24 1 -1 1 -1 -1 1
  [2,24,1,-1,1,-1,-1,1],
// 2 24 -1 -1 1 -1 1 1
  [2,24,-1,-1,1,-1,1,1],
// 2 24 1 -1 1 1 1 1
  [2,24,1,-1,1,1,1,1],
// 2 24 -1 1 -1 -1 1 1
  [2,24,-1,1,-1,-1,1,1],
// 2 24 1 1 -1 1 1 1
  [2,24,1,1,-1,1,1,1],
// 4 16 1 1 1 1 1 -1 -1 1 -1 -1 1 1
  [4,16,1,1,1,1,1,-1,-1,1,-1,-1,1,1],
// 4 16 1 1 1 -1 1 1 -1 -1 1 1 -1 1
  [4,16,1,1,1,-1,1,1,-1,-1,1,1,-1,1],
// 0
];
module ldraw_lib__box2_5(step=0, col=false, unit=2/5, alt=false, line=0.2, solid=!$preview)
    makepoly(ldraw_lib__box2_5(solid), step=step, col=col, unit=unit, alt=alt, line=line, solid=solid);
ldraw_lib__box2_5(line=0.2);
// file: ../p/stug-1x2.scad
use <../lib.scad>
use <stud.scad>
$fa=1; $fs=0.2;
function ldraw_lib__stug_1x2(realsolid=false) = [
// 0 Stud Group  1 x  2
// 0 Name: stug-1x2.dat
// 0 Author: Steffen [Steffen]
// 0 !LDRAW_ORG Primitive UPDATE 2011-01
// 0 !LICENSE Licensed under CC BY 2.0 and CC BY 4.0 : see CAreadme.txt
// 
// 0 BFC CERTIFY CCW
  [0,"BFC","CERTIFY"],
  [0,"BFC","CCW"],
// 
// 0 !HISTORY 2011-07-25 [PTadmin] Official Update 2011-01
// 
// 
// 1 16 -10 0 0 1 0 0 0 1 0 0 0 1 stud.dat
  [1,16,-10,0,0,1,0,0,0,1,0,0,0,1, ldraw_lib__stud(realsolid)],
// 1 16 10 0 0 1 0 0 0 1 0 0 0 1 stud.dat
  [1,16,10,0,0,1,0,0,0,1,0,0,0,1, ldraw_lib__stud(realsolid)],
];
module ldraw_lib__stug_1x2(step=0, col=false, unit=2/5, alt=false, line=0.2, solid=!$preview)
    makepoly(ldraw_lib__stug_1x2(solid), step=step, col=col, unit=unit, alt=alt, line=line, solid=solid);
ldraw_lib__stug_1x2(line=0.2);
// file: s/24299s01.scad
use <../../lib.scad>
use <../../p/box2-5.scad>
use <../../p/box2-7.scad>
use <../../p/box5.scad>
use <51739s01.scad>
use <../../p/stud3.scad>
function ldraw_lib__s__24299s01() = [
// 0 ~Wing  2 x  2 Left without Studs and Top Surface
// 0 Name: s\24299s01.dat
// 0 Author: Magnus Forsberg [MagFors]
// 0 !LDRAW_ORG Subpart UPDATE 2025-07
// 0 !LICENSE Licensed under CC BY 4.0 : see CAreadme.txt
// 
// 0 BFC CERTIFY CCW
  [0,"BFC","CERTIFY"],
  [0,"BFC","CCW"],
// 
// 0 !HISTORY 2017-12-30 [PTadmin] Official Update 2017-01
// 0 !HISTORY 2025-07-12 [MagFors] Removed top surface for prints
// 0 !HISTORY 2025-07-27 [OrionP] Official Update 2025-07
// 
// 1 16 -10 4 0 0 -10 0 -4 0 0 0 0 -20 box2-5.dat
  [1,16,-10,4,0,0,-10,0,-4,0,0,0,0,-20, ldraw_lib__box2_5()],
// 1 16 -0.75 4 18.5 0 19.25 0 -4 0 0 0 0 1.5 box2-7.dat
  [1,16,-0.75,4,18.5,0,19.25,0,-4,0,0,0,0,1.5, ldraw_lib__box2_7()],
// 1 16 -10 3 0 0 0 -1 0 -1.25 0 1 0 0 stud3.dat
  [1,16,-10,3,0,0,0,-1,0,-1.25,0,1,0,0, ldraw_lib__stud3()],
// 0 BFC INVERTNEXT
  [0,"BFC","INVERTNEXT"],
// 1 16 -10 8 0 0 0 -6 0 -5 0 16 0 0 box5.dat
  [1,16,-10,8,0,0,0,-6,0,-5,0,16,0,0, ldraw_lib__box5()],
// 4 16 -4 8 -16 0 8 -20 -20 8 -20 -16 8 -16
  [4,16,-4,8,-16,0,8,-20,-20,8,-20,-16,8,-16],
// 4 16 -16 8 -16 -20 8 -20 -20 8 20 -16 8 16
  [4,16,-16,8,-16,-20,8,-20,-20,8,20,-16,8,16],
// 4 16 -16 8 16 -20 8 20 18.5 8 20 -4 8 16
  [4,16,-16,8,16,-20,8,20,18.5,8,20,-4,8,16],
// 1 16 -20 0 0 1 0 0 0 1 0 0 0 1 s\51739s01.dat
  [1,16,-20,0,0,1,0,0,0,1,0,0,0,1, ldraw_lib__s__51739s01()],
];
module ldraw_lib__s__24299s01(step=0, col=false, unit=2/5, alt=false, line=0.2, solid=!$preview)
    makepoly(ldraw_lib__s__24299s01(), step=step, col=col, unit=unit, alt=alt, line=line, solid=solid);
ldraw_lib__s__24299s01(line=0.2);
// file: s/24299p01s01.scad
use <../../lib.scad>
function ldraw_lib__s__24299p01s01() = [
// 0 ~Wing  2 x  2 Left with 3 Black Stripes
// 0 Name: s\24299p01s01.dat
// 0 Author: Gabriel Läufer [Dr.Bricktacular]
// 0 !LDRAW_ORG Subpart UPDATE 2025-07
// 0 !LICENSE Licensed under CC BY 4.0 : see CAreadme.txt
// 
// 0 BFC CERTIFY CCW
  [0,"BFC","CERTIFY"],
  [0,"BFC","CCW"],
// 
// 0 !HISTORY 2025-07-12 [MagFors] Reworked as pattern subfile
// 0 !HISTORY 2025-07-27 [OrionP] Official Update 2025-07
// 
// 0 // Pattern
// 4 0 17.4 0 17 -1.1 0 17 -1.1 0 9.4 13.6 0 9.4
  [4,0,17.4,0,17,-1.1,0,17,-1.1,0,9.4,13.6,0,9.4],
// 4 0 10.8 0 3.8 -1.1 0 3.8 -1.1 0 -3.8 7 0 -3.8
  [4,0,10.8,0,3.8,-1.1,0,3.8,-1.1,0,-3.8,7,0,-3.8],
// 4 0 4.2 0 -9.4 -1.1 0 -9.4 -1.1 0 -16.7 .55 0 -16.7
  [4,0,4.2,0,-9.4,-1.1,0,-9.4,-1.1,0,-16.7,.55,0,-16.7],
// 4 16 10.8 0 3.8 13.6 0 9.4 -1.1 0 9.4 -1.1 0 3.8
  [4,16,10.8,0,3.8,13.6,0,9.4,-1.1,0,9.4,-1.1,0,3.8],
// 4 16 7 0 -3.8 -1.1 0 -3.8 -1.1 0 -9.4 4.2 0 -9.4
  [4,16,7,0,-3.8,-1.1,0,-3.8,-1.1,0,-9.4,4.2,0,-9.4],
// 3 16 -1.1 0 17 -20 0 20 -1.1 0 9.4
  [3,16,-1.1,0,17,-20,0,20,-1.1,0,9.4],
// 3 16 -1.1 0 9.4 -20 0 20 -1.1 0 3.8
  [3,16,-1.1,0,9.4,-20,0,20,-1.1,0,3.8],
// 4 16 -20 0 20 -20 0 -20 -1.1 0 -3.8 -1.1 0 3.8
  [4,16,-20,0,20,-20,0,-20,-1.1,0,-3.8,-1.1,0,3.8],
// 3 16 -1.1 0 -9.4 -1.1 0 -3.8 -20 0 -20
  [3,16,-1.1,0,-9.4,-1.1,0,-3.8,-20,0,-20],
// 3 16 -1.1 0 -16.7 -1.1 0 -9.4 -20 0 -20
  [3,16,-1.1,0,-16.7,-1.1,0,-9.4,-20,0,-20],
// 4 16 -1.1 0 -16.7 -20 0 -20 0 0 -20 .55 0 -16.7
  [4,16,-1.1,0,-16.7,-20,0,-20,0,0,-20,.55,0,-16.7],
// 4 16 18.5 0 20 -20 0 20 -1.1 0 17 17.4 0 17
  [4,16,18.5,0,20,-20,0,20,-1.1,0,17,17.4,0,17],
// 3 16 18.5 0 17 18.5 0 20 17.4 0 17
  [3,16,18.5,0,17,18.5,0,20,17.4,0,17],
// 3 16 4.2 0 -9.4 .55 0 -16.7 0 0 -20
  [3,16,4.2,0,-9.4,.55,0,-16.7,0,0,-20],
// 3 16 0 0 -20 7 0 -3.8 4.2 0 -9.4
  [3,16,0,0,-20,7,0,-3.8,4.2,0,-9.4],
// 4 16 10.8 0 3.8 7 0 -3.8 0 0 -20 18.5 0 17
  [4,16,10.8,0,3.8,7,0,-3.8,0,0,-20,18.5,0,17],
// 3 16 10.8 0 3.8 18.5 0 17 13.6 0 9.4
  [3,16,10.8,0,3.8,18.5,0,17,13.6,0,9.4],
// 3 16 18.5 0 17 17.4 0 17 13.6 0 9.4
  [3,16,18.5,0,17,17.4,0,17,13.6,0,9.4],
];
module ldraw_lib__s__24299p01s01(step=0, col=false, unit=2/5, alt=false, line=0.2, solid=!$preview)
    makepoly(ldraw_lib__s__24299p01s01(), step=step, col=col, unit=unit, alt=alt, line=line, solid=solid);
ldraw_lib__s__24299p01s01(line=0.2);
// main file
use <../lib.scad>
use <s/24299p01s01.scad>
use <s/24299s01.scad>
use <../p/stug-1x2.scad>
function ldraw_lib__24299p01() = [
// 0 Wing  2 x  2 Left with 3 Black Stripes Pattern
// 0 Name: 24299p01.dat
// 0 Author: Gabriel Läufer [Dr.Bricktacular]
// 0 !LDRAW_ORG Part UPDATE 2025-07
// 0 !LICENSE Licensed under CC BY 4.0 : see CAreadme.txt
// 
// 0 BFC CERTIFY CCW
  [0,"BFC","CERTIFY"],
  [0,"BFC","CCW"],
// 
// 0 !KEYWORDS Bricklink 24299pb01, Captain Rex Helmet, Helmet Collection
// 0 !KEYWORDS Rebrickable 24299pr0001, Set 75349
// 
// 0 !HISTORY 2025-07-12 [MagFors] corrected subfile usage
// 0 !HISTORY 2025-07-27 [OrionP] Official Update 2025-07
// 
// 0 // Pattern-Basepart
// 1 16 -10 0 0 0 0 -1 0 1 0 1 0 0 stug-1x2.dat
  [1,16,-10,0,0,0,0,-1,0,1,0,1,0,0, ldraw_lib__stug_1x2()],
// 1 16 0 0 0 1 0 0 0 1 0 0 0 1 s\24299s01.dat
  [1,16,0,0,0,1,0,0,0,1,0,0,0,1, ldraw_lib__s__24299s01()],
// 0 // Pattern
// 1 16 0 0 0 1 0 0 0 1 0 0 0 1 s\24299p01s01.dat
  [1,16,0,0,0,1,0,0,0,1,0,0,0,1, ldraw_lib__s__24299p01s01()],
];
module ldraw_lib__24299p01(step=0, col=false, unit=2/5, alt=false, line=0.2, solid=!$preview)
    makepoly(ldraw_lib__24299p01(), step=step, col=col, unit=unit, alt=alt, line=line, solid=solid);
ldraw_lib__24299p01(line=0.2);
